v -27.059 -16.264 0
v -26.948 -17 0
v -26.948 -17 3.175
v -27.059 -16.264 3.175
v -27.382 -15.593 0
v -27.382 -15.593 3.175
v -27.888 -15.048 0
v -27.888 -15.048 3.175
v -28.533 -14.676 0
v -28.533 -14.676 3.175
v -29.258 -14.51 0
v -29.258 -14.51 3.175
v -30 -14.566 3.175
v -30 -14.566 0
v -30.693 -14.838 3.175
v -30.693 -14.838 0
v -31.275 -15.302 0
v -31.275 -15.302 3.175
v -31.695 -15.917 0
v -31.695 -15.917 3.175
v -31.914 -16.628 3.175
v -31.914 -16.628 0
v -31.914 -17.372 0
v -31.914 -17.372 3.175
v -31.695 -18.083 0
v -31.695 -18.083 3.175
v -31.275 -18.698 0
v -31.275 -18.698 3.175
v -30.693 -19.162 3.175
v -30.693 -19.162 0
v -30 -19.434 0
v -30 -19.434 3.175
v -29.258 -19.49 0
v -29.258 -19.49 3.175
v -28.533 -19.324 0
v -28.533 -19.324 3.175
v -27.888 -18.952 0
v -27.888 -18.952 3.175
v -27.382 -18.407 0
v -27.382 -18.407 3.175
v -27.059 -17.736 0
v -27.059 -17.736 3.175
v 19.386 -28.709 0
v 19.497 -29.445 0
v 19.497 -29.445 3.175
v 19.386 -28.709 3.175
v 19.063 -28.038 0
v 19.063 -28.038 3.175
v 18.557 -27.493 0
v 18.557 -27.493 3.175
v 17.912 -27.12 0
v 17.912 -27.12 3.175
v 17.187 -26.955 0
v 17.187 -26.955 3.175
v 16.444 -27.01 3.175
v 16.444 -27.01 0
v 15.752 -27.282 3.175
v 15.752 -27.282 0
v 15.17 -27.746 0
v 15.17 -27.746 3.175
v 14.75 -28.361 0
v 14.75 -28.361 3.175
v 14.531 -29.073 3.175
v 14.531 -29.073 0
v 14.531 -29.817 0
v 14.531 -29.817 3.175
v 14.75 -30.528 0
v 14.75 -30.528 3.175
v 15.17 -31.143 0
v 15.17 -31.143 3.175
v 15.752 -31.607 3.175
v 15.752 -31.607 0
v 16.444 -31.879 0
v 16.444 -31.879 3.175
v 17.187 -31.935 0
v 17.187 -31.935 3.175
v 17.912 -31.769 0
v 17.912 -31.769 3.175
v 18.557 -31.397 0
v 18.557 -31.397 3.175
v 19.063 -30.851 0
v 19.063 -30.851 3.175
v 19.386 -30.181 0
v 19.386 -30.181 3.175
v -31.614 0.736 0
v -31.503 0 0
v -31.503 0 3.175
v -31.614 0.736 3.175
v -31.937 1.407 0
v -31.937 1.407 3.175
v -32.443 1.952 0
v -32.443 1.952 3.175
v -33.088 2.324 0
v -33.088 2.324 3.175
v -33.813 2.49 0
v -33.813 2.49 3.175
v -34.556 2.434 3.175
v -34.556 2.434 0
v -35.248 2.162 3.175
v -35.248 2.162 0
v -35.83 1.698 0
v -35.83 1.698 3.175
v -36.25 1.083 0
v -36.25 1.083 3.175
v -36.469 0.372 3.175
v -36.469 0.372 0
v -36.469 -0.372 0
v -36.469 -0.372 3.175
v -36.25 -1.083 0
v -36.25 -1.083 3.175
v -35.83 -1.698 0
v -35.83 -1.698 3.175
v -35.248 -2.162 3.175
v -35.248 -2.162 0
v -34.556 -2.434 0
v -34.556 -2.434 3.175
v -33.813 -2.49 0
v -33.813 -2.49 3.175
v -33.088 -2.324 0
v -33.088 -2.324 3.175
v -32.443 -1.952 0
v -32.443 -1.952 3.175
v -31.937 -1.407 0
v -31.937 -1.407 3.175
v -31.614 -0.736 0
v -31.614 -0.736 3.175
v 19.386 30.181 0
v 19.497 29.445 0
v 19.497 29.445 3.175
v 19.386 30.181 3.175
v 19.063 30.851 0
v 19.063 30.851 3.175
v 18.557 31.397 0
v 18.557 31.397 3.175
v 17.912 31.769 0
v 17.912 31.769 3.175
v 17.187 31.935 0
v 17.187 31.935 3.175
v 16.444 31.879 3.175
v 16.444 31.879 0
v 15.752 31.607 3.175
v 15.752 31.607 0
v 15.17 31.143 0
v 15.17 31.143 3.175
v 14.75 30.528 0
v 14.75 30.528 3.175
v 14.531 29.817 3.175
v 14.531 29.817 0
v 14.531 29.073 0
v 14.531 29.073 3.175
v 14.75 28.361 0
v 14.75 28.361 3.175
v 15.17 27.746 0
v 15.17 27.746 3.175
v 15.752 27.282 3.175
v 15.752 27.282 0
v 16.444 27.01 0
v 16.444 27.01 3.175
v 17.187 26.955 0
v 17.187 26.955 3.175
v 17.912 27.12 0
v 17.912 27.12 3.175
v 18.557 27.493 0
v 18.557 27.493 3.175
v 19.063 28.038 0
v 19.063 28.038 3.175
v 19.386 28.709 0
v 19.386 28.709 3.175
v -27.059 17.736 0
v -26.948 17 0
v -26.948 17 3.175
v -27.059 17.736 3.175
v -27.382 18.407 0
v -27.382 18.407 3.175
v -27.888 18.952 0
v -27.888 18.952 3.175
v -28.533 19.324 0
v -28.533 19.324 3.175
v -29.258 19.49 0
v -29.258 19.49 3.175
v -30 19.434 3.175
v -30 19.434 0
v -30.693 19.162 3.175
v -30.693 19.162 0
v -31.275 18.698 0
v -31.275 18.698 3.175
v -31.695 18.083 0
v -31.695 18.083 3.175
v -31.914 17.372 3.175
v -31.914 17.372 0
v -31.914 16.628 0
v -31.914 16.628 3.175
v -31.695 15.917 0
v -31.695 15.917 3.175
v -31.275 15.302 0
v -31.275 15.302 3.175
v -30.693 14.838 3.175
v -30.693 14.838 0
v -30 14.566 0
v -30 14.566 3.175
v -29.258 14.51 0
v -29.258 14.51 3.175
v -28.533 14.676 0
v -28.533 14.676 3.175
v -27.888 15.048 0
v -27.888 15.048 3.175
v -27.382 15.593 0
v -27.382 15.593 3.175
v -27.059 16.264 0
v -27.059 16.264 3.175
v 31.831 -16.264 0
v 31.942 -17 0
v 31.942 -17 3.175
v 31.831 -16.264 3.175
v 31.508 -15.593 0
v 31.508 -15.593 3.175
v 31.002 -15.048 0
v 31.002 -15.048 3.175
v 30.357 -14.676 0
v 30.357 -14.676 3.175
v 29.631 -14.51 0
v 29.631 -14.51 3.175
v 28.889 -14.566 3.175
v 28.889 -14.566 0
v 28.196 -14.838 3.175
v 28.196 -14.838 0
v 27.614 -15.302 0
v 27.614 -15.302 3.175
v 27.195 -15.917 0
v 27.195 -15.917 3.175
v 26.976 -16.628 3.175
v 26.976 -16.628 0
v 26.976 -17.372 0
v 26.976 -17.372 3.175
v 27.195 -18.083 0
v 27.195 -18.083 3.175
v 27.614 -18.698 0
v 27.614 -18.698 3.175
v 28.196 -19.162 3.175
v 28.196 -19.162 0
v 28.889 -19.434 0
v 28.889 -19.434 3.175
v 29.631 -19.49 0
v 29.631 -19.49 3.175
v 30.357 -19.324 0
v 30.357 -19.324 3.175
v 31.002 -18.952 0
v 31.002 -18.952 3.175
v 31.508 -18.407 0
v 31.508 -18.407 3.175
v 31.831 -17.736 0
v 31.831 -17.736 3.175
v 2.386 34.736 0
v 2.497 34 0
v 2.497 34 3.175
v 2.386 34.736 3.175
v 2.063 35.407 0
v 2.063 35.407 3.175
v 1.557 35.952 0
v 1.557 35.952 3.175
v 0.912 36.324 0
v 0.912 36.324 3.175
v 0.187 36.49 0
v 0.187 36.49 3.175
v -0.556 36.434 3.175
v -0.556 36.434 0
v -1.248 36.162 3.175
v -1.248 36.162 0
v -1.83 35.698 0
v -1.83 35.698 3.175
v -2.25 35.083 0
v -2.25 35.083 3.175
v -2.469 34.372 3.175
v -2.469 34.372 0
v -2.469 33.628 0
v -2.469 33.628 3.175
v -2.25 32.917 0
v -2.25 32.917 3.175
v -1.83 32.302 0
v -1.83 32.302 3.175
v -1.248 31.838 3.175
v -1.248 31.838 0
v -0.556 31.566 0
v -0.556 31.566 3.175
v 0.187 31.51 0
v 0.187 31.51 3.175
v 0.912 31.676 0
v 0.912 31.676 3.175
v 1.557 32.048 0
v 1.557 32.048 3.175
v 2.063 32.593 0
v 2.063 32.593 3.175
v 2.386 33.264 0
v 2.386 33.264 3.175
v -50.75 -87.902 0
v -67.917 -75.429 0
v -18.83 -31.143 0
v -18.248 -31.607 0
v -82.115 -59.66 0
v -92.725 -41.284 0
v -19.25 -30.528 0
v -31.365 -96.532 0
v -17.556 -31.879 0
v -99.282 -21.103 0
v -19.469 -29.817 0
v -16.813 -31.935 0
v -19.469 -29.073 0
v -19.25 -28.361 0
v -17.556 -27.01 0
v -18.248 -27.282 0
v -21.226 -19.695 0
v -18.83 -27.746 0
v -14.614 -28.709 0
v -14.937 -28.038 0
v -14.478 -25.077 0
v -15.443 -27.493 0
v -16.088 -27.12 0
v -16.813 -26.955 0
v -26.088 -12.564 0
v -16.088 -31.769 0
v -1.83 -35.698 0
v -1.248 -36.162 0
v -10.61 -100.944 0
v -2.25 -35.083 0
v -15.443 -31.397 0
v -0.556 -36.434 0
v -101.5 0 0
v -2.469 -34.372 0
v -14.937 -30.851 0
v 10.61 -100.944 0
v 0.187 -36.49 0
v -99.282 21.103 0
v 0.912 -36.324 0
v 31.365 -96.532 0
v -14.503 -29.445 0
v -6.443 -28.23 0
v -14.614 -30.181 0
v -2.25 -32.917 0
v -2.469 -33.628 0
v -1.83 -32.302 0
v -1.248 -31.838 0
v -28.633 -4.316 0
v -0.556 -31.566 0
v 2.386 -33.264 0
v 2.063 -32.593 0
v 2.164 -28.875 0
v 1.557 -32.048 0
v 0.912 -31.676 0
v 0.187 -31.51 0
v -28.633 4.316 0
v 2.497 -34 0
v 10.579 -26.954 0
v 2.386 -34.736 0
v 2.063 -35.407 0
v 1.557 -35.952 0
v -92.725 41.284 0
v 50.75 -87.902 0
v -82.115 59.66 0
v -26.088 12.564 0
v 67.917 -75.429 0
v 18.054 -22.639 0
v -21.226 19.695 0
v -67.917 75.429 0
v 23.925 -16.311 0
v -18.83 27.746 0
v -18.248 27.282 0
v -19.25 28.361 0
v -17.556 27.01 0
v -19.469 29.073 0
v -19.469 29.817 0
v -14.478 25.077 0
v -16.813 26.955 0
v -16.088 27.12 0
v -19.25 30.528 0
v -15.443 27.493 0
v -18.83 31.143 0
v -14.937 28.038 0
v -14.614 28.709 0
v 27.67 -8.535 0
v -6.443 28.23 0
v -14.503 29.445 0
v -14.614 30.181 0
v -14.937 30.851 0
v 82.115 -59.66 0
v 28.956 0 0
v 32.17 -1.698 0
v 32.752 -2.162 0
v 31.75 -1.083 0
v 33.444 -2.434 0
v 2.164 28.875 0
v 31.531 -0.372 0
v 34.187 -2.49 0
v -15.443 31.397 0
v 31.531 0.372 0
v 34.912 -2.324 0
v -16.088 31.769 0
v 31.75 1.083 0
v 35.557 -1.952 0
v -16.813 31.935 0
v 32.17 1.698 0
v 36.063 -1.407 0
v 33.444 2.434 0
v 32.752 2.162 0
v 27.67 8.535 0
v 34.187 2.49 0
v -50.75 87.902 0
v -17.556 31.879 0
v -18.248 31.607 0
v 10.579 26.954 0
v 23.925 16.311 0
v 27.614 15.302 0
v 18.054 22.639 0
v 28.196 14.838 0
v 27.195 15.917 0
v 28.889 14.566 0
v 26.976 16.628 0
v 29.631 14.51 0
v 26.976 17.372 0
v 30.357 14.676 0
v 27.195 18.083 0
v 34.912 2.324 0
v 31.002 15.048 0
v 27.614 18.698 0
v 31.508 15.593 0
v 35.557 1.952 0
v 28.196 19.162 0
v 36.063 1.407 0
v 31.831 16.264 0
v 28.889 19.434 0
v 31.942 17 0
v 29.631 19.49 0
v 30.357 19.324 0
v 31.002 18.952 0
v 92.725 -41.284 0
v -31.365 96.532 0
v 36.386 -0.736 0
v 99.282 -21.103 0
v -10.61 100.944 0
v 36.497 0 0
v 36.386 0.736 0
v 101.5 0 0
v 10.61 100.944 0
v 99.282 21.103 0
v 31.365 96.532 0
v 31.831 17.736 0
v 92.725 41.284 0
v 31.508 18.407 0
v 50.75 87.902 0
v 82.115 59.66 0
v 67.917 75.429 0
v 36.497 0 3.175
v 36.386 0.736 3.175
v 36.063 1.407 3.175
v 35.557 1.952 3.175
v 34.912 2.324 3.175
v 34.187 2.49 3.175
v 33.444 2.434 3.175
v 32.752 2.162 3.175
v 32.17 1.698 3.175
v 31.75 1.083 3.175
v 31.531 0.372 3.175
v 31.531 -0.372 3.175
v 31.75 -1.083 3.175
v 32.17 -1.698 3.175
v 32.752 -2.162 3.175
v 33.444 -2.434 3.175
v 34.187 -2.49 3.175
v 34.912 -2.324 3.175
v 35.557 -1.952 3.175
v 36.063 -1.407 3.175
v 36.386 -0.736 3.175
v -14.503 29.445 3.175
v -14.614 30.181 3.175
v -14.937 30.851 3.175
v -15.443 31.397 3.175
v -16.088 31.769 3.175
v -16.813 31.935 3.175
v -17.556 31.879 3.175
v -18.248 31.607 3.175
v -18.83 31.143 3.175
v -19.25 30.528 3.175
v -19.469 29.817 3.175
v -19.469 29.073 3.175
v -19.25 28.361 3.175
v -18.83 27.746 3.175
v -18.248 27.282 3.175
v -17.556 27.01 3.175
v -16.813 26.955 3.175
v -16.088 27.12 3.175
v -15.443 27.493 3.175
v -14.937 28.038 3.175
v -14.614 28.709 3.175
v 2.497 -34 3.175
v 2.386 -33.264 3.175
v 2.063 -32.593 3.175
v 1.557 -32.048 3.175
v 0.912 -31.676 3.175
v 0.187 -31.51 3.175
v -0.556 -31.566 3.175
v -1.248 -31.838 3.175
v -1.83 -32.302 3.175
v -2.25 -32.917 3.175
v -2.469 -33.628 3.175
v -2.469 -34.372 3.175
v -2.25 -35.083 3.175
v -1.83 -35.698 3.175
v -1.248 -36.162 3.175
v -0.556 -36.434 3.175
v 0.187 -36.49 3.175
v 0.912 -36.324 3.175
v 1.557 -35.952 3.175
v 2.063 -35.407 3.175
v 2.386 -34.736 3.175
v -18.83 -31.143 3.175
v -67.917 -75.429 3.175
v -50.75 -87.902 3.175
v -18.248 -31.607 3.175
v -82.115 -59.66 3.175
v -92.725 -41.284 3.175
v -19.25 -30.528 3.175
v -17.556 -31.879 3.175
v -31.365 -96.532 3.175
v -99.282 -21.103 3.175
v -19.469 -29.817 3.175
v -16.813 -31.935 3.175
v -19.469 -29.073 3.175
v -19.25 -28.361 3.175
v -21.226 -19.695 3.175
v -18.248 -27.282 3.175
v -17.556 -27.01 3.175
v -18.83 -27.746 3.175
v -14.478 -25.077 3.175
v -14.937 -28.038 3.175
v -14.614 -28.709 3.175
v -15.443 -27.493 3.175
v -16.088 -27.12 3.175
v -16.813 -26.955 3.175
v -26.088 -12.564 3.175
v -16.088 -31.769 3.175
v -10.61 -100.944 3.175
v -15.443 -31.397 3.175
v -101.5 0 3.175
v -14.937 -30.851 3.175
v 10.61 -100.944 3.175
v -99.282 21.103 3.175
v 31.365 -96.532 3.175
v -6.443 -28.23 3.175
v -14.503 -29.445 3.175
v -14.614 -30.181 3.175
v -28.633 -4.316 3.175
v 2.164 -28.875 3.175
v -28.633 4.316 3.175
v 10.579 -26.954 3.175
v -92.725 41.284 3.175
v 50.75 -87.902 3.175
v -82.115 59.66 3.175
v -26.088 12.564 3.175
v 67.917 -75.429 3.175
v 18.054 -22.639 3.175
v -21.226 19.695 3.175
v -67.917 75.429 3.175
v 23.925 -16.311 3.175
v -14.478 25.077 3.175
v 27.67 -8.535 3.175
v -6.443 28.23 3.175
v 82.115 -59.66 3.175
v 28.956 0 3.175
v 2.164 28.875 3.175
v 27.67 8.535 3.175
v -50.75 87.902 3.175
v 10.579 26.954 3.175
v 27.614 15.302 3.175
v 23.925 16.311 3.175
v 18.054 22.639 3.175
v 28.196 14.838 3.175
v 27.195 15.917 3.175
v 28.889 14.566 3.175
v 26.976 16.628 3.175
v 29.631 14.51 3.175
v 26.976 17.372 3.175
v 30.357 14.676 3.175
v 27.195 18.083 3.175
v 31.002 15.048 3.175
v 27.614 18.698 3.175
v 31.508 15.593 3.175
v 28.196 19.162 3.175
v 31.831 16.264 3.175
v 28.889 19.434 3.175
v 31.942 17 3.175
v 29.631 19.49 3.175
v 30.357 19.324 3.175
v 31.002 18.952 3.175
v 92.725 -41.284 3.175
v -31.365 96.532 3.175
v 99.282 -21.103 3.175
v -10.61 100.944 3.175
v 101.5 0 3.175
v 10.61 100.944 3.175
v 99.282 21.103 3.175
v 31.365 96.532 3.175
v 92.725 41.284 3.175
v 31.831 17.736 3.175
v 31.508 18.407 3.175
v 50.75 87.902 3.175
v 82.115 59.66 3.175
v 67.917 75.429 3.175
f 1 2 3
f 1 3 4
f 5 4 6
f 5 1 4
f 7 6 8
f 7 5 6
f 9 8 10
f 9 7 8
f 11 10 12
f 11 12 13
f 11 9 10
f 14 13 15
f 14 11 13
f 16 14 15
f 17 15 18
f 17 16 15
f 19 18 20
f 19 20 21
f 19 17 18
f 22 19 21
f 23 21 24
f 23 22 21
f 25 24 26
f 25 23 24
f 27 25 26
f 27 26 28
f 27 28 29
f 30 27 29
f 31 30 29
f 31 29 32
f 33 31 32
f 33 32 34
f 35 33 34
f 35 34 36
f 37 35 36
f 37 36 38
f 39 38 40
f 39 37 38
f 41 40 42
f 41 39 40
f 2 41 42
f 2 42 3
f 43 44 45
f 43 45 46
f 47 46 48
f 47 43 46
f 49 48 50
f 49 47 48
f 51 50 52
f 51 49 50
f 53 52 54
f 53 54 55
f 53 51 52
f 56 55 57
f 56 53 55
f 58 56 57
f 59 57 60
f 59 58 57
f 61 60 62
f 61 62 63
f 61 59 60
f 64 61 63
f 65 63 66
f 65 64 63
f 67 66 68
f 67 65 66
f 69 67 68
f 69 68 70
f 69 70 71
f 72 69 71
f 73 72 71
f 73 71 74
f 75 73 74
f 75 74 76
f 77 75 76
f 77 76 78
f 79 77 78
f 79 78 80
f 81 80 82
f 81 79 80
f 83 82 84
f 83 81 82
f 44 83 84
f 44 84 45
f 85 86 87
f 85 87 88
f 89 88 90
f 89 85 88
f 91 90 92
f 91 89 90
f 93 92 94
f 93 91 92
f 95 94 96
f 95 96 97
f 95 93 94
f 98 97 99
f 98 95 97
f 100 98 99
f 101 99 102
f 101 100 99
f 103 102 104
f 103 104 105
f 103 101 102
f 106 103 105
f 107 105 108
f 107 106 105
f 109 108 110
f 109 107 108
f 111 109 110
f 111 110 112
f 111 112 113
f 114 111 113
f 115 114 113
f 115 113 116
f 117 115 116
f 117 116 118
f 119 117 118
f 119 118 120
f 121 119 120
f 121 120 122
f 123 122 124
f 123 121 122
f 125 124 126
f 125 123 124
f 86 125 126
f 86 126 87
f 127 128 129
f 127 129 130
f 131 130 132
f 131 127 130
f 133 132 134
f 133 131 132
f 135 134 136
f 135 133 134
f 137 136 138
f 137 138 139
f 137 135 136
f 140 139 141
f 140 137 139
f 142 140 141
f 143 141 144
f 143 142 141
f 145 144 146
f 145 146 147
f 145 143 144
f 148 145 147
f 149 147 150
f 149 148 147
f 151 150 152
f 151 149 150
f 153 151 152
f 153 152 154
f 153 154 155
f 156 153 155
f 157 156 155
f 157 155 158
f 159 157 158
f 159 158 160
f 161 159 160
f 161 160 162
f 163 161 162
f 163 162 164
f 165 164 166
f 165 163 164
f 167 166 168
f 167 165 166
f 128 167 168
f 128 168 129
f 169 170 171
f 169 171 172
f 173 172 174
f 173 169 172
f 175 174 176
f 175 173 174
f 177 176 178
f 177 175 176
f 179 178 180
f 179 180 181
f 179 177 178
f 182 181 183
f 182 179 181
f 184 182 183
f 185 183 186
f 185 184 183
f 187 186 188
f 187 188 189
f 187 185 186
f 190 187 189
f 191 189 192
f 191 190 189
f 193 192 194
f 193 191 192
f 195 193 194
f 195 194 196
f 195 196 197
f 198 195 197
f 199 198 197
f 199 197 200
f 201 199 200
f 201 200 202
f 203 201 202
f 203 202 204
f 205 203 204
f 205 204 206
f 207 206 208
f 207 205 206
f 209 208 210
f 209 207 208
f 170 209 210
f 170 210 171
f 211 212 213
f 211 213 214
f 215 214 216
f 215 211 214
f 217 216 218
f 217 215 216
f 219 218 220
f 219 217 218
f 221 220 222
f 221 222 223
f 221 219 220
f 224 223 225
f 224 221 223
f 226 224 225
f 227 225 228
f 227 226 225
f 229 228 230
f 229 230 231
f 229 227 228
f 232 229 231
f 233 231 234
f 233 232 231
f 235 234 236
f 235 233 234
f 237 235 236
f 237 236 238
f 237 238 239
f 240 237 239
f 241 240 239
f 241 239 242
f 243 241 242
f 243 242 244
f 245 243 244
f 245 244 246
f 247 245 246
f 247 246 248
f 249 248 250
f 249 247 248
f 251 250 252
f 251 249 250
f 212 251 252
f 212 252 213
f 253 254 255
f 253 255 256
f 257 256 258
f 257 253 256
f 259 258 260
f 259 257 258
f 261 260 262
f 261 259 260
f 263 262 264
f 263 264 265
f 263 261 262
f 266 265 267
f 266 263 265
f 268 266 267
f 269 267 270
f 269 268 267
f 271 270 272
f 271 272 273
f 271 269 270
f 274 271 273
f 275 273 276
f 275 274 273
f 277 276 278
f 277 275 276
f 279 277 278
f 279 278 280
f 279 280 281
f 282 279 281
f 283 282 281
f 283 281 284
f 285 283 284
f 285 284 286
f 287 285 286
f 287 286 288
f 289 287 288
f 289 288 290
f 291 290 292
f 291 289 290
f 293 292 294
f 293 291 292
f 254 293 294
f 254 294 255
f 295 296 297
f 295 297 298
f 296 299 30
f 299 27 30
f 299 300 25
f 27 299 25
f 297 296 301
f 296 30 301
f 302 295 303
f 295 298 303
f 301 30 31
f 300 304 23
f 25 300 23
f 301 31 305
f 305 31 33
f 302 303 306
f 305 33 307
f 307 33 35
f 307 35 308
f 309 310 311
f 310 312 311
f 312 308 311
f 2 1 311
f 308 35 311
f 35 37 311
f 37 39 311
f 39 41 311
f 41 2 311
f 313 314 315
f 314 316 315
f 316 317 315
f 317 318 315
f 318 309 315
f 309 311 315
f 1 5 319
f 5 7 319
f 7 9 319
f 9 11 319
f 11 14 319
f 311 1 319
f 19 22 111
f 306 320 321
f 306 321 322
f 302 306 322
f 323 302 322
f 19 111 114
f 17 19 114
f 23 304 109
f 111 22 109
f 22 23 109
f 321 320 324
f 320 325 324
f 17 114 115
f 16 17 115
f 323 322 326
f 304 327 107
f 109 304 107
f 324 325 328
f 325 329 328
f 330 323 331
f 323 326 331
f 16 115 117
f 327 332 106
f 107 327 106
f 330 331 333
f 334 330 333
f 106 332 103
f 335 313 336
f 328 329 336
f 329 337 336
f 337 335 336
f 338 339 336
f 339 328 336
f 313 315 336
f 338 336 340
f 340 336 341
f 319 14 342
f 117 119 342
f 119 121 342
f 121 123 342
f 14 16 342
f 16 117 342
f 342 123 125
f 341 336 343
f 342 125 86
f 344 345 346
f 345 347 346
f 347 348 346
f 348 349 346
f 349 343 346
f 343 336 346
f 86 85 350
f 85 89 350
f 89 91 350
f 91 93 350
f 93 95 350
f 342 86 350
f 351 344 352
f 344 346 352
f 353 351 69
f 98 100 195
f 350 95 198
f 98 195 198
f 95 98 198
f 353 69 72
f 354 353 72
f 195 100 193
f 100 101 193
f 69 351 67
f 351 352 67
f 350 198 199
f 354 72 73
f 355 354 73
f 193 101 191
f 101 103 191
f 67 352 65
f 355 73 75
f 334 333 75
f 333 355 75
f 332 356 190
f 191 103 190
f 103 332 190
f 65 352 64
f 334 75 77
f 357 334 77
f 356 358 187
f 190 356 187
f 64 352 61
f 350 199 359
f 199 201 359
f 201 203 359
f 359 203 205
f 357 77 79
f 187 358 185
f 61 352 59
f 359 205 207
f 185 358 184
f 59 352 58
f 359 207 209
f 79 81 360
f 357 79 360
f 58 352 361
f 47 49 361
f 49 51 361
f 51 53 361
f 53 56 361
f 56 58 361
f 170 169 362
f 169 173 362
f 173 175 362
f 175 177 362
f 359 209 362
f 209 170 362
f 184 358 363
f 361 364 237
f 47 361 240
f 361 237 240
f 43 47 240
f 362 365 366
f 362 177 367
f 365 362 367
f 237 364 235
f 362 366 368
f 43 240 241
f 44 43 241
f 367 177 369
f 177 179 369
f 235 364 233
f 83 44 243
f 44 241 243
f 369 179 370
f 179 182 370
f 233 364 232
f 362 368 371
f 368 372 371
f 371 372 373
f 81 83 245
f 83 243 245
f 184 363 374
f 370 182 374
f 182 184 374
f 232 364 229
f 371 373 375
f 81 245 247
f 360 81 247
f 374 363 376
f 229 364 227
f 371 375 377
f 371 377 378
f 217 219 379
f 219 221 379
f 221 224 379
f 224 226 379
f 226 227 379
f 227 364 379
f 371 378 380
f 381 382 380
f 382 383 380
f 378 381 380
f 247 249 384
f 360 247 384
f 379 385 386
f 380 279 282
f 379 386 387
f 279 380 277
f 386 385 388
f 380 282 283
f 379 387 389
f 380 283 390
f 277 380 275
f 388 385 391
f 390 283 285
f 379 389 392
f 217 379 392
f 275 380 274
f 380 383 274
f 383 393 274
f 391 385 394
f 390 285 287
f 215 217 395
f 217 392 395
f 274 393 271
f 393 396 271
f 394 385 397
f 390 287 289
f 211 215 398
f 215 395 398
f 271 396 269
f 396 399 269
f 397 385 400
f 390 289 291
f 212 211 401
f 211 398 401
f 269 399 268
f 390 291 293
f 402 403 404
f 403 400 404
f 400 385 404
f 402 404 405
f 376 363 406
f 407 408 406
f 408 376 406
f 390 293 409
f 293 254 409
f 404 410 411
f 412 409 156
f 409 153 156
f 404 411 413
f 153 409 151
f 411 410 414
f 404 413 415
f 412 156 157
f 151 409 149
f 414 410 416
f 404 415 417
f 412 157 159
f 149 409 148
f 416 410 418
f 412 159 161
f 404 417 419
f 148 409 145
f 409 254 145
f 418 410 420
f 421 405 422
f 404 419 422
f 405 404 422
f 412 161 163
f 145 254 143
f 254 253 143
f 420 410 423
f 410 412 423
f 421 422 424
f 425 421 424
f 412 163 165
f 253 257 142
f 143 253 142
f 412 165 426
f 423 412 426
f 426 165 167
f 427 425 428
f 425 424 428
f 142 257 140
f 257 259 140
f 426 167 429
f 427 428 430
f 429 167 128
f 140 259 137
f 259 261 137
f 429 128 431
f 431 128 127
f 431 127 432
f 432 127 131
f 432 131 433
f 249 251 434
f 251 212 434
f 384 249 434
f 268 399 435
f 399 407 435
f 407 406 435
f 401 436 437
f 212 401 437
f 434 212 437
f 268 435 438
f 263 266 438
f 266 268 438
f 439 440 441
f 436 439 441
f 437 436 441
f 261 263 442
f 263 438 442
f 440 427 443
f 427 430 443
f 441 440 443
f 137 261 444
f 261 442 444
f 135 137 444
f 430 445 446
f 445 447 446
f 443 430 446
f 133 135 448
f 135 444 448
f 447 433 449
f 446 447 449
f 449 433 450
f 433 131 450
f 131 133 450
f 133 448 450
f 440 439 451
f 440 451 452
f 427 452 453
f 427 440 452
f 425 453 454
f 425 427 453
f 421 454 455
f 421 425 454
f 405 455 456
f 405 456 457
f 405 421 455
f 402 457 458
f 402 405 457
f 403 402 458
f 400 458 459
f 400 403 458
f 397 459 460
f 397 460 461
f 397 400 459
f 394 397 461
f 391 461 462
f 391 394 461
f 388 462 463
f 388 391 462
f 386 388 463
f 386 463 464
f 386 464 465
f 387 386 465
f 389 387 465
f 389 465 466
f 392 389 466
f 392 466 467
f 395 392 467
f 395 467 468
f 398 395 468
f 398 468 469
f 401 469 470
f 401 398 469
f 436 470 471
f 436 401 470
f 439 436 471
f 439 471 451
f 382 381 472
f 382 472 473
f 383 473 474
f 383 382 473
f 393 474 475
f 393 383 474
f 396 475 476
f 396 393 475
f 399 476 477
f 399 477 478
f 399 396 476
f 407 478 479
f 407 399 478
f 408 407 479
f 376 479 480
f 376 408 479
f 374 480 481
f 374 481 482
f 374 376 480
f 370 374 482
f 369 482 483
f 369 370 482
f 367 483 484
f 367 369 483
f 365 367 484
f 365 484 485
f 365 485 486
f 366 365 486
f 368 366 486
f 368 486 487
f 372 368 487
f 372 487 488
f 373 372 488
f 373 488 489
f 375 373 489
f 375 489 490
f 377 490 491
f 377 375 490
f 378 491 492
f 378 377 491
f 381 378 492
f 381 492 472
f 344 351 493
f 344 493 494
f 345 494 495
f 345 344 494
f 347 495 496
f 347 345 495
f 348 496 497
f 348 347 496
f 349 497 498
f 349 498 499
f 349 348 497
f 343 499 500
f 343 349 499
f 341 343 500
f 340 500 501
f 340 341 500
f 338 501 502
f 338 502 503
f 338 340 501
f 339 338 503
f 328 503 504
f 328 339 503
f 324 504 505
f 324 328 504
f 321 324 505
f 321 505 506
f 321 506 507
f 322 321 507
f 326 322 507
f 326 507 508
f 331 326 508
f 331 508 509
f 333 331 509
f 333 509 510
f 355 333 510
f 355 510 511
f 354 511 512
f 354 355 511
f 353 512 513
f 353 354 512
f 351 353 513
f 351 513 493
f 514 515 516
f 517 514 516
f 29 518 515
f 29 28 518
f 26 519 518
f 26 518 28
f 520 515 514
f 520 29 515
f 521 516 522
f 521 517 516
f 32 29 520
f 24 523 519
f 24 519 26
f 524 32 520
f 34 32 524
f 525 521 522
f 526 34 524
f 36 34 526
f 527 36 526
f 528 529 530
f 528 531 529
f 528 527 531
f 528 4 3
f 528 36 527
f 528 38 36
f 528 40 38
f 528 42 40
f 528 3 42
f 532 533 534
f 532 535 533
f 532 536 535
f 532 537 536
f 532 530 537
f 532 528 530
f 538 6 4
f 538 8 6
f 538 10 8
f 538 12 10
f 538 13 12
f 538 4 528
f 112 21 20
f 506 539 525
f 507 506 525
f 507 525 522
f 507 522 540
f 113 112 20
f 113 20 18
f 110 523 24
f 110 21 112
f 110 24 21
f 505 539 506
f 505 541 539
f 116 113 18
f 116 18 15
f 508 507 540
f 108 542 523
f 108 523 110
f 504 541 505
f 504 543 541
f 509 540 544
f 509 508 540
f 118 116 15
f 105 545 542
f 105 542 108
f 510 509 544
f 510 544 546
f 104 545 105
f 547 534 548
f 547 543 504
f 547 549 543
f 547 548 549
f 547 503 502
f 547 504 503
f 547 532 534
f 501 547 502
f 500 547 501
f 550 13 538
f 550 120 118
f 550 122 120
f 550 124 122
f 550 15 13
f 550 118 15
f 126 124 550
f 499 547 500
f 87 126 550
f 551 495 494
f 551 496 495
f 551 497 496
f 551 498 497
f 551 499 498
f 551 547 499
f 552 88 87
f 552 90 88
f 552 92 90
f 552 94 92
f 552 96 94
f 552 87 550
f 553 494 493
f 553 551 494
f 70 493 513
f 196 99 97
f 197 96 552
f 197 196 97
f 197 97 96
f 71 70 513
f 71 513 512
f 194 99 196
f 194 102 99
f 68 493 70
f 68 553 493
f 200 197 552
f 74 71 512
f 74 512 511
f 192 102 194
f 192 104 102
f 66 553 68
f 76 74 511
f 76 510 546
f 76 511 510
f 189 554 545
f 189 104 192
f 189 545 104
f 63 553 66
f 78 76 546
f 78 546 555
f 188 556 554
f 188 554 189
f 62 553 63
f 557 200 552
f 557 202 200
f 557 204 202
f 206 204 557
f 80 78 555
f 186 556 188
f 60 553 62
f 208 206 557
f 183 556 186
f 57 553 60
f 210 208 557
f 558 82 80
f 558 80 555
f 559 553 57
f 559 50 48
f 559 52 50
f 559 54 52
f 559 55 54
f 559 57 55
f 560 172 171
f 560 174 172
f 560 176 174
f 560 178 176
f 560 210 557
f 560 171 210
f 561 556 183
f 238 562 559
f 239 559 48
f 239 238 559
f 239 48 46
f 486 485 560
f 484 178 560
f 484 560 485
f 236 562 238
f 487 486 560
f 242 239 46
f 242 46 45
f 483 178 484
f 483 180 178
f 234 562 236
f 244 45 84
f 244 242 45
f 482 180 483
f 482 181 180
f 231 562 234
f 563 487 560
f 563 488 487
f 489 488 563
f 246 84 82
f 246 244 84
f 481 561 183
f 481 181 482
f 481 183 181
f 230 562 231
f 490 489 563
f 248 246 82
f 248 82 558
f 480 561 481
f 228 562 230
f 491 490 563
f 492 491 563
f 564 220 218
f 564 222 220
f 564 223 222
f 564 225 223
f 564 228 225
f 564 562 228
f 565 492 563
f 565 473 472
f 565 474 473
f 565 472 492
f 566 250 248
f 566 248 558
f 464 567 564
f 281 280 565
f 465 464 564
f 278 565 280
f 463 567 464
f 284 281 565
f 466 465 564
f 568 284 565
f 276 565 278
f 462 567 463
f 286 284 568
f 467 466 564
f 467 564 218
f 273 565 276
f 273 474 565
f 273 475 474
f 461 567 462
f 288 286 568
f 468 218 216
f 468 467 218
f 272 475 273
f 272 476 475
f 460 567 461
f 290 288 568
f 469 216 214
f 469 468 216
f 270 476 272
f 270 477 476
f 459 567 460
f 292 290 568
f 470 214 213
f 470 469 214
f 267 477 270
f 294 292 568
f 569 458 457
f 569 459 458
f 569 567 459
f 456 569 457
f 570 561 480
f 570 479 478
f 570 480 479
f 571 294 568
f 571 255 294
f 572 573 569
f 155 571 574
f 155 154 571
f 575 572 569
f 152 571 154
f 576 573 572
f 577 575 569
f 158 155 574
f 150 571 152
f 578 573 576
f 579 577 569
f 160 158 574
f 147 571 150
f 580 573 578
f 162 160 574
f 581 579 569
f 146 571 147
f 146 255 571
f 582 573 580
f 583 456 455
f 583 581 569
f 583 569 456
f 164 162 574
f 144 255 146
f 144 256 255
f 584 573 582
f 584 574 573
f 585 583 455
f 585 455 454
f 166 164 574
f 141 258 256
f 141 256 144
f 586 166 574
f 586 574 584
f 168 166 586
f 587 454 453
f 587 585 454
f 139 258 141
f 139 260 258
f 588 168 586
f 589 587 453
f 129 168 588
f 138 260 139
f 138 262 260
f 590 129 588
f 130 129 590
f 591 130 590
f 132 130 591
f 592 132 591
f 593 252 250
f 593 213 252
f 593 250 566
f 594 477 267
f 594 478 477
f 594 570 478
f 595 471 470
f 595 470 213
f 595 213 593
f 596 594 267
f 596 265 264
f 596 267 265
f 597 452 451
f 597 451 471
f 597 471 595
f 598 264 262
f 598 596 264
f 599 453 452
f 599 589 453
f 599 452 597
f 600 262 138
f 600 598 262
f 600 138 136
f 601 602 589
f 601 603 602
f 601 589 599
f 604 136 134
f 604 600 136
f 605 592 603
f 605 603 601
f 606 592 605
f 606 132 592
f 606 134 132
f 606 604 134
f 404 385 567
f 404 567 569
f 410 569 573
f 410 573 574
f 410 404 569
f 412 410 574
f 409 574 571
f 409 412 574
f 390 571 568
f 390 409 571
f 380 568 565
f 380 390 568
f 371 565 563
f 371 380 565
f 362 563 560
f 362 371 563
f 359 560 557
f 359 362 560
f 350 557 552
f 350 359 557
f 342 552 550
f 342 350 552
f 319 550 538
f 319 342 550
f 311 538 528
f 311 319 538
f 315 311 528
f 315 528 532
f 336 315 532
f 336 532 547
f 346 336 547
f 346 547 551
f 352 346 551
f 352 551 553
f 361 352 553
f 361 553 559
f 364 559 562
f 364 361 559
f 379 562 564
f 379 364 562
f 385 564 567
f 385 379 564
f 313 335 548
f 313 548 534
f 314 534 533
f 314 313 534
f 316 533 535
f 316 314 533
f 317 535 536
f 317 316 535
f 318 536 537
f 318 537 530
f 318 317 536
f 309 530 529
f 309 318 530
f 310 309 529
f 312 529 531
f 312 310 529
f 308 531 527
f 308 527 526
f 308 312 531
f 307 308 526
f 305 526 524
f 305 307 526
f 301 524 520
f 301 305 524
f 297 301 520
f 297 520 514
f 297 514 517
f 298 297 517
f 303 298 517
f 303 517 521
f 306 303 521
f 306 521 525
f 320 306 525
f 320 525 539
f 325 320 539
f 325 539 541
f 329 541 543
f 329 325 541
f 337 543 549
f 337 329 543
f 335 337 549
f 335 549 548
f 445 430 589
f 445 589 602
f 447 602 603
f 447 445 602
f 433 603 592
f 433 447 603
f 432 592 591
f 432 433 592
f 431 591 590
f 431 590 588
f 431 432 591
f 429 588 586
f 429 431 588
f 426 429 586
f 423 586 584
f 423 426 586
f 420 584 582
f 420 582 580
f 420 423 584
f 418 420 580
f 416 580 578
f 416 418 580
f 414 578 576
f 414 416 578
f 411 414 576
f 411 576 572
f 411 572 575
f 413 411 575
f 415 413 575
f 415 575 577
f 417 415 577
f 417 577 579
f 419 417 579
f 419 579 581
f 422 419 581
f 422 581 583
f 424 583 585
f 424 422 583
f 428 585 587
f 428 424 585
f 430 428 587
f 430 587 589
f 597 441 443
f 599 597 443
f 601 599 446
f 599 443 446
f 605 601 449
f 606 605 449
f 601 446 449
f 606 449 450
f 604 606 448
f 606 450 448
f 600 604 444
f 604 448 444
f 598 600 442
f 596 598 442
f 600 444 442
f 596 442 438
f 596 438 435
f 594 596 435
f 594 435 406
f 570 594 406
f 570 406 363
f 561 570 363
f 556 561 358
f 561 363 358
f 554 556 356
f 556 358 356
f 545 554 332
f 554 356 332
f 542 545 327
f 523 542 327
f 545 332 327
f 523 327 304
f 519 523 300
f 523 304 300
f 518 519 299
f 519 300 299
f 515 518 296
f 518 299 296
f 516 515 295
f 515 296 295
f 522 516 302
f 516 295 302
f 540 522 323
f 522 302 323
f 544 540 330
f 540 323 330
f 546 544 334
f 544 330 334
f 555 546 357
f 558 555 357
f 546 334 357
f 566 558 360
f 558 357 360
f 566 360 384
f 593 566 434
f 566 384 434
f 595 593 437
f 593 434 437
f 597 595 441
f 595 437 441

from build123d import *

# Parameters (mm, degrees)
SKETCH1_R           = 101.5
SKETCH1_R_2         = 28.956
SKETCH1_R_3         = 2.49698907
BOSS_EXTRUDE1_DEPTH = 3.175


with BuildPart() as part:
    # Sketch1 → Boss-Extrude1 (new body)
    with BuildSketch(Plane.XY):
        Circle(SKETCH1_R)
        Circle(SKETCH1_R_2, mode=Mode.SUBTRACT)
        with Locations((0, 34)):
            Circle(SKETCH1_R_3, mode=Mode.SUBTRACT)
        with Locations((17, 29.444863729)):
            Circle(SKETCH1_R_3, mode=Mode.SUBTRACT)
        with Locations((29.444863729, 17)):
            Circle(SKETCH1_R_3, mode=Mode.SUBTRACT)
        with Locations((34, 0)):
            Circle(SKETCH1_R_3, mode=Mode.SUBTRACT)
        with Locations((29.444863729, -17)):
            Circle(SKETCH1_R_3, mode=Mode.SUBTRACT)
        with Locations((17, -29.444863729)):
            Circle(SKETCH1_R_3, mode=Mode.SUBTRACT)
        with Locations((0, -34)):
            Circle(SKETCH1_R_3, mode=Mode.SUBTRACT)
        with Locations((-17, -29.444863729)):
            Circle(SKETCH1_R_3, mode=Mode.SUBTRACT)
        with Locations((-29.444863729, -17)):
            Circle(SKETCH1_R_3, mode=Mode.SUBTRACT)
        with Locations((-34, 0)):
            Circle(SKETCH1_R_3, mode=Mode.SUBTRACT)
        with Locations((-29.444863729, 17)):
            Circle(SKETCH1_R_3, mode=Mode.SUBTRACT)
        with Locations((-17, 29.444863729)):
            Circle(SKETCH1_R_3, mode=Mode.SUBTRACT)
    extrude(amount=BOSS_EXTRUDE1_DEPTH)


solid = part.part
